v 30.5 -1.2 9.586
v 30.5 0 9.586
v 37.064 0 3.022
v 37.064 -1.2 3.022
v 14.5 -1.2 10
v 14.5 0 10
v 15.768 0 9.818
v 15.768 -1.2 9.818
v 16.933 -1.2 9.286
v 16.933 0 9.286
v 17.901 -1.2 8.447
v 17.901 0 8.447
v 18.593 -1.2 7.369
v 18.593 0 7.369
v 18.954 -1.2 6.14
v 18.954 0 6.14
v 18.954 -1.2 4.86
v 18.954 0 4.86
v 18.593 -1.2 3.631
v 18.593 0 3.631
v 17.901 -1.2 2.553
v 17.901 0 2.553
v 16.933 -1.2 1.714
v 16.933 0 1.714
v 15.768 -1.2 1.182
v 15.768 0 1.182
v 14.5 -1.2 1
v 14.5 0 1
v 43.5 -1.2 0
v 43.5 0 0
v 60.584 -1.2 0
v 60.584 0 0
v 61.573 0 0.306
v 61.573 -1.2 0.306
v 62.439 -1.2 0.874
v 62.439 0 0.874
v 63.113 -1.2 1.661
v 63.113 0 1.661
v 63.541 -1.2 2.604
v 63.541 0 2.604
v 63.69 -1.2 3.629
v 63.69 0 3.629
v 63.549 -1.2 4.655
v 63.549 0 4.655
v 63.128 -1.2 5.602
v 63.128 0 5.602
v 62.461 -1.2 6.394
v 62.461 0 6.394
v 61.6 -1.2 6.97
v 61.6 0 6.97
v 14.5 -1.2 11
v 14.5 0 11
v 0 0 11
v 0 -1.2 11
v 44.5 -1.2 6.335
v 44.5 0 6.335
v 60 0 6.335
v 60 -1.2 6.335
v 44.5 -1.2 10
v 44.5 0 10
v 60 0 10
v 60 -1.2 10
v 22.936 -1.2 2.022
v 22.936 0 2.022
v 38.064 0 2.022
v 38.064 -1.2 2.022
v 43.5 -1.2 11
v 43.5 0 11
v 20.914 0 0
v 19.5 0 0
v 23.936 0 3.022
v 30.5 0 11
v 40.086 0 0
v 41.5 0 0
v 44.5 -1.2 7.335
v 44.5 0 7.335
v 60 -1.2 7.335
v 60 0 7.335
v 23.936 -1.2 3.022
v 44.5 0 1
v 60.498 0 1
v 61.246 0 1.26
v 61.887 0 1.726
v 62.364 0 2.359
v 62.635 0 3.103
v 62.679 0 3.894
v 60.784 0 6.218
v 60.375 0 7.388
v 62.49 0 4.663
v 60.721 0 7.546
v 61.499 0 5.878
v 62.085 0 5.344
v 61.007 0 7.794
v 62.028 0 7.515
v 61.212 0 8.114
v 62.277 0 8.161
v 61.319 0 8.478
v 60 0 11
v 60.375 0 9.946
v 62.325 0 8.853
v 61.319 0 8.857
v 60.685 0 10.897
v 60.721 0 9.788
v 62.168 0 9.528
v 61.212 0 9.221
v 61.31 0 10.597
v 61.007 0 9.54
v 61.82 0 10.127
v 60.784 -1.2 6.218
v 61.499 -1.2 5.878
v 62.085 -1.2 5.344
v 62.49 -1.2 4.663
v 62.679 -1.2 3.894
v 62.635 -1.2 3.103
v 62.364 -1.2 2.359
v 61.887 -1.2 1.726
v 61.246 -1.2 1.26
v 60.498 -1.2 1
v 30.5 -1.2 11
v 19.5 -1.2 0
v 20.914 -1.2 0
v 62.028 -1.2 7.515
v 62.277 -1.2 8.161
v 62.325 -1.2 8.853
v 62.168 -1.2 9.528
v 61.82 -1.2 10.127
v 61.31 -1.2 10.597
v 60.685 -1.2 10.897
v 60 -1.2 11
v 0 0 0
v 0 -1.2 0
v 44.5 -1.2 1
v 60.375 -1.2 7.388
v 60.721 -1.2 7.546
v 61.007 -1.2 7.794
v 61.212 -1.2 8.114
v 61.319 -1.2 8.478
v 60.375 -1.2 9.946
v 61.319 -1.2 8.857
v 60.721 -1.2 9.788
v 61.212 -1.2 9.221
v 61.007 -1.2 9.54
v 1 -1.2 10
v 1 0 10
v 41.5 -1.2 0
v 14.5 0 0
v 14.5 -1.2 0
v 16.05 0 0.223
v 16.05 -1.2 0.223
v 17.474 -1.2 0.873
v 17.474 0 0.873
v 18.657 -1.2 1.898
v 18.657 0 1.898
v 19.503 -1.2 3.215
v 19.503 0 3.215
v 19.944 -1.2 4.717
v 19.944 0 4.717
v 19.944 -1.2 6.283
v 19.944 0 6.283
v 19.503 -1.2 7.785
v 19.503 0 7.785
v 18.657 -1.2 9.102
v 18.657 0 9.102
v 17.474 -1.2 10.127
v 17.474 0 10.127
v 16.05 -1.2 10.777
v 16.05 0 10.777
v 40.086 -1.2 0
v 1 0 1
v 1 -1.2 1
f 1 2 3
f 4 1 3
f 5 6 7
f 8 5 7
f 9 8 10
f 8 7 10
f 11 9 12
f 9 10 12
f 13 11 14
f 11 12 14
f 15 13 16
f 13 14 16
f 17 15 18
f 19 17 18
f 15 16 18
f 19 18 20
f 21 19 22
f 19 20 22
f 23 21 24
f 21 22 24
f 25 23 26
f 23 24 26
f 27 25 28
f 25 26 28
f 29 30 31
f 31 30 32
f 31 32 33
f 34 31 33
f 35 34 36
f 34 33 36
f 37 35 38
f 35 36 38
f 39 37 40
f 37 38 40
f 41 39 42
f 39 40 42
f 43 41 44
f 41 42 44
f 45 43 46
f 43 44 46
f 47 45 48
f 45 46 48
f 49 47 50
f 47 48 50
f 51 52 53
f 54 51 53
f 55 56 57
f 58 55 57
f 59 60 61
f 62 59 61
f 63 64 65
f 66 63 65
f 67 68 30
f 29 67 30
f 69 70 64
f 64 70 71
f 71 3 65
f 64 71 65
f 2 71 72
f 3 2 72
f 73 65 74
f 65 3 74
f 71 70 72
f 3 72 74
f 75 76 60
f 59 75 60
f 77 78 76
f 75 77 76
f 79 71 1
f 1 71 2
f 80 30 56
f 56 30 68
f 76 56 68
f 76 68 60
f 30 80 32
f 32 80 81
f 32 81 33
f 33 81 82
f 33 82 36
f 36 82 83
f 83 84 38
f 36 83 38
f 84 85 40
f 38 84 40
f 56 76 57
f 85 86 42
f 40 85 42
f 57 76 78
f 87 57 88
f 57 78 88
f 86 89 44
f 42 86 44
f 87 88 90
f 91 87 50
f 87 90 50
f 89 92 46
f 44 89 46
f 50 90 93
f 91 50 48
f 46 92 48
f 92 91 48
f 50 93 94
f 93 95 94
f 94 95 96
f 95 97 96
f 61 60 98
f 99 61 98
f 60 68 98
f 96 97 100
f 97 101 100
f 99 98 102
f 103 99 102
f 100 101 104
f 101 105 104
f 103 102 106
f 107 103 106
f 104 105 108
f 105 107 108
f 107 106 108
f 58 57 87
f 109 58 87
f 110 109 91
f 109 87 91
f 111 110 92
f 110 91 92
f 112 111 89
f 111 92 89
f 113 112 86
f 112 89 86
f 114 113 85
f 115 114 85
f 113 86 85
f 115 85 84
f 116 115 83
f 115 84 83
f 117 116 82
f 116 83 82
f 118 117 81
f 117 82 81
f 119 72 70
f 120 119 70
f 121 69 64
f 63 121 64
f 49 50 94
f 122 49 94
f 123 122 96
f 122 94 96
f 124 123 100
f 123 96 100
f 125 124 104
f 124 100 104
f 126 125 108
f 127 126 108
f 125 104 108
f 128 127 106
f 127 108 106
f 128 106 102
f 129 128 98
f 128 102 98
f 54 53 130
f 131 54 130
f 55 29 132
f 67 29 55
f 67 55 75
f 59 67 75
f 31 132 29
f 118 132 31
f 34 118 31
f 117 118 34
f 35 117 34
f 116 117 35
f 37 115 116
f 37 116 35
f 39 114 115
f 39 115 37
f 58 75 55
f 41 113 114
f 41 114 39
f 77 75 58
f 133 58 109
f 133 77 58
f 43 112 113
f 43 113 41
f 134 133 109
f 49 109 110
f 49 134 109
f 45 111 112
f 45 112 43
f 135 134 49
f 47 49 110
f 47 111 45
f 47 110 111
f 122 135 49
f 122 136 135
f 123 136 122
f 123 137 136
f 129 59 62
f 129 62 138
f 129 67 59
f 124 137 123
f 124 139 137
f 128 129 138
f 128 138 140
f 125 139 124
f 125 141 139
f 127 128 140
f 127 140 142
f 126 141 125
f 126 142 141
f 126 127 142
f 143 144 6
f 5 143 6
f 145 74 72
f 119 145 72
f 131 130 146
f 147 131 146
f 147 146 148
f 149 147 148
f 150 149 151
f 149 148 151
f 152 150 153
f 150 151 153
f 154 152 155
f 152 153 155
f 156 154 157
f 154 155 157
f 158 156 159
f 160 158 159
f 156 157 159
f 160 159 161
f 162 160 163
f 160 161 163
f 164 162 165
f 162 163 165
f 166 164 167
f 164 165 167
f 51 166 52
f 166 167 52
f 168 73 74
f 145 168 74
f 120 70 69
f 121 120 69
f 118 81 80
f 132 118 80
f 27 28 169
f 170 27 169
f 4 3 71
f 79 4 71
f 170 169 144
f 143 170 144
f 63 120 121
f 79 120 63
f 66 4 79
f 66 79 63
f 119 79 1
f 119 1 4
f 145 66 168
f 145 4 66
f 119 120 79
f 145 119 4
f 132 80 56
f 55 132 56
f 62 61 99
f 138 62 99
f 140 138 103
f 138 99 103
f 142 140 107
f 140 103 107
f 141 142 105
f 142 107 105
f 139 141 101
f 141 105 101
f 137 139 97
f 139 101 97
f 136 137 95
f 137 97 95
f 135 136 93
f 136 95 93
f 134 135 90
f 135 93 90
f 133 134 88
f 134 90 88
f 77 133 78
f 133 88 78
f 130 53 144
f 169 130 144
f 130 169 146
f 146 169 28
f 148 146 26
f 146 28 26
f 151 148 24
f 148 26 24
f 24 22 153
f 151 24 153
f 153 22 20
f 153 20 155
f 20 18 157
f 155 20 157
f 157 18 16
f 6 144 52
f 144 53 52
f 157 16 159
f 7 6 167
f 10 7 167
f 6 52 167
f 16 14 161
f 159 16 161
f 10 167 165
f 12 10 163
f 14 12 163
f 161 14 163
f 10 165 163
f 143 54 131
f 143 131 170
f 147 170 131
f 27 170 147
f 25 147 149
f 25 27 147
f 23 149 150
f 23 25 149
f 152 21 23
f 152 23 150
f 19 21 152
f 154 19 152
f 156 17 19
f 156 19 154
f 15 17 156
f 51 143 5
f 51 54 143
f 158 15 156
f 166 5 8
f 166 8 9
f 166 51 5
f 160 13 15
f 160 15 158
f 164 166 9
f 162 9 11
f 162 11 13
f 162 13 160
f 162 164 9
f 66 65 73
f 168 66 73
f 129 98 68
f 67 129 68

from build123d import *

# Parameters (mm, degrees)
F1_DEPTH = 1.2


with BuildPart() as f1:
    # F0 (on Front) → F1 (new body)
    with BuildSketch(Plane.XZ):
        with BuildLine():
            Line((0, 11), (0, 0))
            Line((0, 0), (14.5, 0))
            ThreePointArc((14.5, 0), (20, 5.5), (14.5, 11))
            Line((14.5, 11), (0, 11))
        make_face()
        with BuildLine():
            Line((14.5, 1), (1, 1))
            Line((1, 1), (1, 10))
            Line((1, 10), (14.5, 10))
            ThreePointArc((14.5, 10), (19, 5.5), (14.5, 1))
        make_face(mode=Mode.SUBTRACT)
        Polygon((30.5, 11), (19.5, 0), (20.914214, 0), (22.936261, 2.022048), (38.063739, 2.022048), (40.085786, 0), (41.5, 0), align=None)
        Polygon((23.936261, 3.022048), (30.5, 9.585786), (37.063739, 3.022048), align=None, mode=Mode.SUBTRACT)
        with BuildLine():
            Line((43.5, 11), (43.5, 0))
            Line((43.5, 0), (60.583511, 0))
            ThreePointArc((60.583511, 0), (63.651835, 3.111466), (61.599954, 6.969654))
            ThreePointArc((61.599954, 6.969654), (62.168152, 9.527961), (60, 11))
            Line((60, 11), (43.5, 11))
        make_face()
        with BuildLine():
            Line((60.497634, 1), (44.5, 1))
            Line((44.5, 1), (44.5, 6.334509))
            Line((44.5, 6.334509), (60, 6.334509))
            ThreePointArc((60, 6.334509), (62.678835, 3.893941), (60.497634, 1))
        make_face(mode=Mode.SUBTRACT)
        with BuildLine():
            Line((44.5, 7.334509), (44.5, 10))
            Line((44.5, 10), (60, 10))
            ThreePointArc((60, 10), (61.332745, 8.667255), (60, 7.334509))
            Line((60, 7.334509), (44.5, 7.334509))
        make_face(mode=Mode.SUBTRACT)
    extrude(amount=F1_DEPTH)


solid = f1.part
